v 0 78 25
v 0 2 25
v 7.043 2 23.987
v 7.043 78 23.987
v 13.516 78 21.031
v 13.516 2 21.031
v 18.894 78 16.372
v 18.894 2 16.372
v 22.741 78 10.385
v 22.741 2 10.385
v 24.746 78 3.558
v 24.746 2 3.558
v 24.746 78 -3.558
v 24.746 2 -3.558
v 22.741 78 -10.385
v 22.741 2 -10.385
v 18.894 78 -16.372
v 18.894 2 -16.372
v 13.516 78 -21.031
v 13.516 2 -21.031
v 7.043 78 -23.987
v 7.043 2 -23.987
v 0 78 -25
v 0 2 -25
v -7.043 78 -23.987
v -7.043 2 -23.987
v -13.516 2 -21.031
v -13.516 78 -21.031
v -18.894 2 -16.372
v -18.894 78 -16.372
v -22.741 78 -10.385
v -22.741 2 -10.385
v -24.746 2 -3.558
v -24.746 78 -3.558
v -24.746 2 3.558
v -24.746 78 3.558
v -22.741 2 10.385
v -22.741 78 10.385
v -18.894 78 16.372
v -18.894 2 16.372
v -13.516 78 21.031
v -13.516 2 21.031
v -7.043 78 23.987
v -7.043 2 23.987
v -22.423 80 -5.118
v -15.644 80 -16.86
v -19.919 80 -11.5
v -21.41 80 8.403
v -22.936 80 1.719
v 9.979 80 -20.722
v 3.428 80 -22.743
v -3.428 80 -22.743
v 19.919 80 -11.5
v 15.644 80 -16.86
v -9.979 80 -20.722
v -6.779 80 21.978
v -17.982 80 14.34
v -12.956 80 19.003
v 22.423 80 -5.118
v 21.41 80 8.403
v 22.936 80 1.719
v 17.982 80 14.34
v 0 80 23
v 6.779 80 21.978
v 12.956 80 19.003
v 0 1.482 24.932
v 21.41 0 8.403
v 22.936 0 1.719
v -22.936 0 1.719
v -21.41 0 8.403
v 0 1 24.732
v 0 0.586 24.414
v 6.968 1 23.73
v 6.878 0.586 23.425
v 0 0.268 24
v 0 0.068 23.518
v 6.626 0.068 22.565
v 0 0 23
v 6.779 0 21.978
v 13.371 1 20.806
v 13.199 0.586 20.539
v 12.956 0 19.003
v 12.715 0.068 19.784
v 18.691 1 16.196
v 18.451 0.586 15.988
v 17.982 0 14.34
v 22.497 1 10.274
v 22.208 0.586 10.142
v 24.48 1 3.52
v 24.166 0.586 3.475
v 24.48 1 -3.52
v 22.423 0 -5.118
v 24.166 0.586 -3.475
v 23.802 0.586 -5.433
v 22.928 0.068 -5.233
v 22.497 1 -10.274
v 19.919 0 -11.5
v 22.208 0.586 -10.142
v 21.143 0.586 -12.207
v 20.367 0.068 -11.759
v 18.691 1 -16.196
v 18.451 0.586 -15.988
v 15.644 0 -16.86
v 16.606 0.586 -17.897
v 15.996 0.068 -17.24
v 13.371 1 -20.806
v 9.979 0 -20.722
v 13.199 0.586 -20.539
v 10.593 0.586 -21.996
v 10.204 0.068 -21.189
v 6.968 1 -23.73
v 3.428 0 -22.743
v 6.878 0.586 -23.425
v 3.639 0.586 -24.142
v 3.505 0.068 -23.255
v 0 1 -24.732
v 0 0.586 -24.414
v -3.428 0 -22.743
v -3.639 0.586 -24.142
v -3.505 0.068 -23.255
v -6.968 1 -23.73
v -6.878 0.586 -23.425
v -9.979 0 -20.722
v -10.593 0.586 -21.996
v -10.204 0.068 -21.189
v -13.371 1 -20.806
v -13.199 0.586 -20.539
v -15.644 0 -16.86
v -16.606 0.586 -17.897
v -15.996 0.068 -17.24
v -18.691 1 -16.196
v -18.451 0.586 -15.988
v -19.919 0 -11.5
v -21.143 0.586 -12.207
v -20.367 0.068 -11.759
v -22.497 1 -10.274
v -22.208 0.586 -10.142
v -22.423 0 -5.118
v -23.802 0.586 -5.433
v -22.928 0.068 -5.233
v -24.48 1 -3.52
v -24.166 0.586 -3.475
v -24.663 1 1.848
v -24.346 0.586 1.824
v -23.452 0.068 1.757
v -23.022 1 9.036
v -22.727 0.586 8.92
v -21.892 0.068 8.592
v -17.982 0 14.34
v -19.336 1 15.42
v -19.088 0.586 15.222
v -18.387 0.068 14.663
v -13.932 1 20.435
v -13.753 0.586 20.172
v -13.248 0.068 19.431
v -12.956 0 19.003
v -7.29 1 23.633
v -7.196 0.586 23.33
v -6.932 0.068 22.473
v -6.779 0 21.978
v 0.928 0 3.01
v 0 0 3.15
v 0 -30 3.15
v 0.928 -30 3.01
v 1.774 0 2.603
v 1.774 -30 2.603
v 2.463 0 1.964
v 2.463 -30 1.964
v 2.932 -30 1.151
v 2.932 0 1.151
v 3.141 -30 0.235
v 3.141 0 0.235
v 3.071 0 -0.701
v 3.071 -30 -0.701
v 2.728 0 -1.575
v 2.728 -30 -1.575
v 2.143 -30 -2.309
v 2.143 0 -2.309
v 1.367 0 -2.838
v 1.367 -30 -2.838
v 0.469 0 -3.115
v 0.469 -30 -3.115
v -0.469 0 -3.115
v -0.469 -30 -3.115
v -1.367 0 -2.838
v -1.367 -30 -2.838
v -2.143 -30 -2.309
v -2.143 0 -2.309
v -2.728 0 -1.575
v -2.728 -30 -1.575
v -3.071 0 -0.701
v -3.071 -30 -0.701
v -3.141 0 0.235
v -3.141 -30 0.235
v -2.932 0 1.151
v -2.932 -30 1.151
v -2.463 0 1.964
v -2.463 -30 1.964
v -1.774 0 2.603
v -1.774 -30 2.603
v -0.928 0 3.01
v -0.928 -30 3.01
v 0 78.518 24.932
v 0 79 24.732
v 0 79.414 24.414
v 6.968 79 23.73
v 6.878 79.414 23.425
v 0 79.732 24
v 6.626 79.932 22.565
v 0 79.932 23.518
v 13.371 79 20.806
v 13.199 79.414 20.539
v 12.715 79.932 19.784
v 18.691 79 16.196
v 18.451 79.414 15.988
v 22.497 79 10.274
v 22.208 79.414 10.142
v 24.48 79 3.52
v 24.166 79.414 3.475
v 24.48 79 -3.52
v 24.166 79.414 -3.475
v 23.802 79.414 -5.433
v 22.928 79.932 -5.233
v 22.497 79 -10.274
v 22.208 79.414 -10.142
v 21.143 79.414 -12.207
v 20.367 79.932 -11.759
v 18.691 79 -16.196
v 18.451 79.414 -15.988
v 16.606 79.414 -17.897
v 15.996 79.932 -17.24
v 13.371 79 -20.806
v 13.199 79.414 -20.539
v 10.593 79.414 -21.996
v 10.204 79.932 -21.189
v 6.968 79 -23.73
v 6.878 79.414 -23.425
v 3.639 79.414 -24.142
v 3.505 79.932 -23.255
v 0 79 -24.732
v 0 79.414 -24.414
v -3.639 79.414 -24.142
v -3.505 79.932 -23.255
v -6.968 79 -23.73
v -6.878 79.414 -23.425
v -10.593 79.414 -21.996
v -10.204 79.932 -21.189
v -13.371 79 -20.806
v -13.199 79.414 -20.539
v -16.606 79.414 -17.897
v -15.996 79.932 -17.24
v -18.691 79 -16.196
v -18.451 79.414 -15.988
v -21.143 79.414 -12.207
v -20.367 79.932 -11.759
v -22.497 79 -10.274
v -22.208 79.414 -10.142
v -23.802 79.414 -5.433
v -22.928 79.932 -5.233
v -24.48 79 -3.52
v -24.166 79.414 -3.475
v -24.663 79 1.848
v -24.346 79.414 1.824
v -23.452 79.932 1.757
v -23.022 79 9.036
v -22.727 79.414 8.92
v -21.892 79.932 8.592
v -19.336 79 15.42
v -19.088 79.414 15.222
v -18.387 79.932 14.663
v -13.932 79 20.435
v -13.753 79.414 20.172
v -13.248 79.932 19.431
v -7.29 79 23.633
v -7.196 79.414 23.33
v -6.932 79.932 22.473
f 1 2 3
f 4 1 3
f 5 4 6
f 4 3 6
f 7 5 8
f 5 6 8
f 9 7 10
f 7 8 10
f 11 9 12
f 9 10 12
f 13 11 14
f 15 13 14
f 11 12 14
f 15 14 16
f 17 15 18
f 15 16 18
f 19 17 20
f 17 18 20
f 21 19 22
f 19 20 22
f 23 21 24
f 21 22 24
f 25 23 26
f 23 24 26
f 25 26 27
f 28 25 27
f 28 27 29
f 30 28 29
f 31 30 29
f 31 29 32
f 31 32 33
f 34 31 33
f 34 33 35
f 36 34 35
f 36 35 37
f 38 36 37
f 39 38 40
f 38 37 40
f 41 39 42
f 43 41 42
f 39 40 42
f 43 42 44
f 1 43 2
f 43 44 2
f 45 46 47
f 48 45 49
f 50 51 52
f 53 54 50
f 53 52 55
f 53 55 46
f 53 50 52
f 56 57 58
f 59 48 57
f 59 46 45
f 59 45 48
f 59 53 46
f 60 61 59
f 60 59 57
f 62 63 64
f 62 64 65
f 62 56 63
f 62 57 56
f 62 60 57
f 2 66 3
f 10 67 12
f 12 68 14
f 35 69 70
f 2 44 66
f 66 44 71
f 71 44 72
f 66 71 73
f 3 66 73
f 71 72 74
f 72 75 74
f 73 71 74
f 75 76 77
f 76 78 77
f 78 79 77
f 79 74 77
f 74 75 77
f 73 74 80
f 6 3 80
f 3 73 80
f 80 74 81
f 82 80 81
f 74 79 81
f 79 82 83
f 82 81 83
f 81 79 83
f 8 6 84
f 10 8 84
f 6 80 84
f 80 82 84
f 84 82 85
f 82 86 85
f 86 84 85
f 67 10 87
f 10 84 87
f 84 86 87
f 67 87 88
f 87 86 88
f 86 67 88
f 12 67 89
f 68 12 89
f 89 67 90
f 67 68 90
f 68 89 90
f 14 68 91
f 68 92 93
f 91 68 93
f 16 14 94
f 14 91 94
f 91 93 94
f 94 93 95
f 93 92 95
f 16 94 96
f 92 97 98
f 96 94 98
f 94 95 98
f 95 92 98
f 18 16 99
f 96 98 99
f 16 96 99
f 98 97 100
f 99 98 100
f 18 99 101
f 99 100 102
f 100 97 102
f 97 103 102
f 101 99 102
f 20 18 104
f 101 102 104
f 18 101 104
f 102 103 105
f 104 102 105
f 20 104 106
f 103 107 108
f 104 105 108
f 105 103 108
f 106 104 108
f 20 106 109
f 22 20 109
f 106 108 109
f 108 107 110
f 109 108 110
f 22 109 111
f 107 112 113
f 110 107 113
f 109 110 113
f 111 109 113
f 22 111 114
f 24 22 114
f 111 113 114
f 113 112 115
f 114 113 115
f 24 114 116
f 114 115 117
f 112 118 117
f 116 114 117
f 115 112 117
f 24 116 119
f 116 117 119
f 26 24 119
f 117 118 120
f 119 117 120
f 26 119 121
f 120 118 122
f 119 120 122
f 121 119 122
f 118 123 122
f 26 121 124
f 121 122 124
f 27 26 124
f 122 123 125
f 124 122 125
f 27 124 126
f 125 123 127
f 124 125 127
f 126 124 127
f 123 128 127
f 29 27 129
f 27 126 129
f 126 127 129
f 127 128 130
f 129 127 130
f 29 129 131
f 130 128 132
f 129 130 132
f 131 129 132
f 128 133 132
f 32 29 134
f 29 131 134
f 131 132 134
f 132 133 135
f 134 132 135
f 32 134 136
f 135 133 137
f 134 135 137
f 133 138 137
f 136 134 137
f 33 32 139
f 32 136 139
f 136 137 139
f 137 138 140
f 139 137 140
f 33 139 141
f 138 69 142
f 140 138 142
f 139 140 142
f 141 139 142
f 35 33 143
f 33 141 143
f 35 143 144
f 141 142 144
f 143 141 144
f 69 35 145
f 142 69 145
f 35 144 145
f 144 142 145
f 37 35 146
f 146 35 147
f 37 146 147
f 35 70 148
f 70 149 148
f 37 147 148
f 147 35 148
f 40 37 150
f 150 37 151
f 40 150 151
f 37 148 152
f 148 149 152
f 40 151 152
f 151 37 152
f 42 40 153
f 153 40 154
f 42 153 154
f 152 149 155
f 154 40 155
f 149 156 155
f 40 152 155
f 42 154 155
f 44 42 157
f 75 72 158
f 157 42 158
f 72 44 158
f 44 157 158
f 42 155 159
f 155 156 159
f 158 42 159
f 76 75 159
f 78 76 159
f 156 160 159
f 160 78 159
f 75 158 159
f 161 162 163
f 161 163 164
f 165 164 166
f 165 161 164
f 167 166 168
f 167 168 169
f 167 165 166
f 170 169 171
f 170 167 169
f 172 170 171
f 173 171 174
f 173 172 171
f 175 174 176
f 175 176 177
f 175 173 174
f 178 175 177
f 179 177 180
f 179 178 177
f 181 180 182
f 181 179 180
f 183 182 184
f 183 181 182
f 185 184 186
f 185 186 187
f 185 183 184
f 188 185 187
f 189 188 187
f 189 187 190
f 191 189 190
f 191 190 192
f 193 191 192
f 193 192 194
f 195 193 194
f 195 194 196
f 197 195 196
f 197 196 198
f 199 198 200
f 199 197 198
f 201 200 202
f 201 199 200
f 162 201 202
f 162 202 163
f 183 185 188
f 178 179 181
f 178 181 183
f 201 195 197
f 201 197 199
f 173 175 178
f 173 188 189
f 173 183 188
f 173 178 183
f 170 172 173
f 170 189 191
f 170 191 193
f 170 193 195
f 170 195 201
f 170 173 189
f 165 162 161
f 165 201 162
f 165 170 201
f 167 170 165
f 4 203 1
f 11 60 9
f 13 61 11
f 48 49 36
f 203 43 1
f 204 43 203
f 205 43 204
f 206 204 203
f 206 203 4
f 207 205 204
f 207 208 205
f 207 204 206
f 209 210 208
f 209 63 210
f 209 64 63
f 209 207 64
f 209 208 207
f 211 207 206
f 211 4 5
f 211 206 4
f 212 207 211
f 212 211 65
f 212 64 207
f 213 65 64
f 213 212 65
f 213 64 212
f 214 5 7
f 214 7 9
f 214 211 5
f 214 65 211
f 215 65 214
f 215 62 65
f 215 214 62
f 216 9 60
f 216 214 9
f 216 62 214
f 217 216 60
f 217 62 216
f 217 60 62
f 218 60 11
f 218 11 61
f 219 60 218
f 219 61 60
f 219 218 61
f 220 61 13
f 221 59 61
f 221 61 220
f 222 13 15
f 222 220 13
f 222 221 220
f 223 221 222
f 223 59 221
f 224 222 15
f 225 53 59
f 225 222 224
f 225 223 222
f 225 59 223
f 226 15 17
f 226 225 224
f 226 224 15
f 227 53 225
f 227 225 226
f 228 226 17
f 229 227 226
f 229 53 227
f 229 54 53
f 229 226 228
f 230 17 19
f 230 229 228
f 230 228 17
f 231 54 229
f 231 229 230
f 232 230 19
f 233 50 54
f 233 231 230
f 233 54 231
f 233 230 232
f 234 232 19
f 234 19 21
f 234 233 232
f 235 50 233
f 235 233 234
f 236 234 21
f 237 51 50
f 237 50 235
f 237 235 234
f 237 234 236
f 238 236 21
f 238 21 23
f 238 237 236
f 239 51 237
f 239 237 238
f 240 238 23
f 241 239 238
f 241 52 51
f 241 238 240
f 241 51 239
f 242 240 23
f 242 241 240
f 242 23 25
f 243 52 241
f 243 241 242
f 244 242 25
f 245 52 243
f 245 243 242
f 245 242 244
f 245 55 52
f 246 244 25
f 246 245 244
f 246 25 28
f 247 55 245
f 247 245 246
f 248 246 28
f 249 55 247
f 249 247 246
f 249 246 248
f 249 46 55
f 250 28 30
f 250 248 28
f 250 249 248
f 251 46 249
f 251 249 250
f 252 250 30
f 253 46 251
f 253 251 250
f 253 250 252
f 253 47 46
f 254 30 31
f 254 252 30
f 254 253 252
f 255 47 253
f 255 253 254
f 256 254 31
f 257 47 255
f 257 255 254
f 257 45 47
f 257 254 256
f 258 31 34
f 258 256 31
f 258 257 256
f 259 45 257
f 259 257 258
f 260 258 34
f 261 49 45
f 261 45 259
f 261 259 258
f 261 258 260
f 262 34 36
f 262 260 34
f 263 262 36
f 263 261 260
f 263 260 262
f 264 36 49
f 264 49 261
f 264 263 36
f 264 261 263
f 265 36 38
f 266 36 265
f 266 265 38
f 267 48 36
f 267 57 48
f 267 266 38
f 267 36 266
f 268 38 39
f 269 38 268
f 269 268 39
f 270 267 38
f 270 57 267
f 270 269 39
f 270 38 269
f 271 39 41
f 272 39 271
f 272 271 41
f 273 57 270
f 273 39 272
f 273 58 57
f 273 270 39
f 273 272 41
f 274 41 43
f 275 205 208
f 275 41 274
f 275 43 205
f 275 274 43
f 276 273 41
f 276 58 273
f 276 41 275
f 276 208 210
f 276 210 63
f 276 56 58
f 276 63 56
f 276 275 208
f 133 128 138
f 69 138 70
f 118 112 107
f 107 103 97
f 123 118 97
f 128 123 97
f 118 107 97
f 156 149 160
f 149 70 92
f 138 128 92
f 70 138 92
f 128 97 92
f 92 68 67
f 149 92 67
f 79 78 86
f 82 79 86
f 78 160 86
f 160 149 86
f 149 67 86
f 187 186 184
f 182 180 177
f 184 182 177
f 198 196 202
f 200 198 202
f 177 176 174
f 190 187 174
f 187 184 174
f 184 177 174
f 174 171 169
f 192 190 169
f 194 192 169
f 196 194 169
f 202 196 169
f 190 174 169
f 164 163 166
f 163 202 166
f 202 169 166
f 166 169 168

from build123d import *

# Parameters (mm, degrees)
SKETCH1_R           = 25
BOSS_EXTRUDE1_DEPTH = 80
SKETCH1_2_R         = 3.15
BOSS_EXTRUDE2_DEPTH = 30
FILLET1_R           = 2


with BuildPart() as part:
    # Sketch1 → Boss-Extrude1 (new body)
    with BuildSketch(Plane(origin=(0, 0, 0), x_dir=(1, 0, 0), z_dir=(0, 1, 0))):
        Circle(SKETCH1_R)
    extrude(amount=BOSS_EXTRUDE1_DEPTH)

    # Fillet1
    fillet1_edges = [part.edges().sort_by_distance(p)[0] for p in [
        (-25, 0, 0),
        (-25, 80, 0),
    ]]
    fillet(fillet1_edges, radius=FILLET1_R)


with BuildPart() as body_2:
    # Sketch1<2> → Boss-Extrude2 (new body)
    with BuildSketch(Plane(origin=(0, 0, 0), x_dir=(1, 0, 0), z_dir=(0, 1, 0))):
        Circle(SKETCH1_2_R)
    extrude(amount=-BOSS_EXTRUDE2_DEPTH)


solid = Compound([part.part, body_2.part])
